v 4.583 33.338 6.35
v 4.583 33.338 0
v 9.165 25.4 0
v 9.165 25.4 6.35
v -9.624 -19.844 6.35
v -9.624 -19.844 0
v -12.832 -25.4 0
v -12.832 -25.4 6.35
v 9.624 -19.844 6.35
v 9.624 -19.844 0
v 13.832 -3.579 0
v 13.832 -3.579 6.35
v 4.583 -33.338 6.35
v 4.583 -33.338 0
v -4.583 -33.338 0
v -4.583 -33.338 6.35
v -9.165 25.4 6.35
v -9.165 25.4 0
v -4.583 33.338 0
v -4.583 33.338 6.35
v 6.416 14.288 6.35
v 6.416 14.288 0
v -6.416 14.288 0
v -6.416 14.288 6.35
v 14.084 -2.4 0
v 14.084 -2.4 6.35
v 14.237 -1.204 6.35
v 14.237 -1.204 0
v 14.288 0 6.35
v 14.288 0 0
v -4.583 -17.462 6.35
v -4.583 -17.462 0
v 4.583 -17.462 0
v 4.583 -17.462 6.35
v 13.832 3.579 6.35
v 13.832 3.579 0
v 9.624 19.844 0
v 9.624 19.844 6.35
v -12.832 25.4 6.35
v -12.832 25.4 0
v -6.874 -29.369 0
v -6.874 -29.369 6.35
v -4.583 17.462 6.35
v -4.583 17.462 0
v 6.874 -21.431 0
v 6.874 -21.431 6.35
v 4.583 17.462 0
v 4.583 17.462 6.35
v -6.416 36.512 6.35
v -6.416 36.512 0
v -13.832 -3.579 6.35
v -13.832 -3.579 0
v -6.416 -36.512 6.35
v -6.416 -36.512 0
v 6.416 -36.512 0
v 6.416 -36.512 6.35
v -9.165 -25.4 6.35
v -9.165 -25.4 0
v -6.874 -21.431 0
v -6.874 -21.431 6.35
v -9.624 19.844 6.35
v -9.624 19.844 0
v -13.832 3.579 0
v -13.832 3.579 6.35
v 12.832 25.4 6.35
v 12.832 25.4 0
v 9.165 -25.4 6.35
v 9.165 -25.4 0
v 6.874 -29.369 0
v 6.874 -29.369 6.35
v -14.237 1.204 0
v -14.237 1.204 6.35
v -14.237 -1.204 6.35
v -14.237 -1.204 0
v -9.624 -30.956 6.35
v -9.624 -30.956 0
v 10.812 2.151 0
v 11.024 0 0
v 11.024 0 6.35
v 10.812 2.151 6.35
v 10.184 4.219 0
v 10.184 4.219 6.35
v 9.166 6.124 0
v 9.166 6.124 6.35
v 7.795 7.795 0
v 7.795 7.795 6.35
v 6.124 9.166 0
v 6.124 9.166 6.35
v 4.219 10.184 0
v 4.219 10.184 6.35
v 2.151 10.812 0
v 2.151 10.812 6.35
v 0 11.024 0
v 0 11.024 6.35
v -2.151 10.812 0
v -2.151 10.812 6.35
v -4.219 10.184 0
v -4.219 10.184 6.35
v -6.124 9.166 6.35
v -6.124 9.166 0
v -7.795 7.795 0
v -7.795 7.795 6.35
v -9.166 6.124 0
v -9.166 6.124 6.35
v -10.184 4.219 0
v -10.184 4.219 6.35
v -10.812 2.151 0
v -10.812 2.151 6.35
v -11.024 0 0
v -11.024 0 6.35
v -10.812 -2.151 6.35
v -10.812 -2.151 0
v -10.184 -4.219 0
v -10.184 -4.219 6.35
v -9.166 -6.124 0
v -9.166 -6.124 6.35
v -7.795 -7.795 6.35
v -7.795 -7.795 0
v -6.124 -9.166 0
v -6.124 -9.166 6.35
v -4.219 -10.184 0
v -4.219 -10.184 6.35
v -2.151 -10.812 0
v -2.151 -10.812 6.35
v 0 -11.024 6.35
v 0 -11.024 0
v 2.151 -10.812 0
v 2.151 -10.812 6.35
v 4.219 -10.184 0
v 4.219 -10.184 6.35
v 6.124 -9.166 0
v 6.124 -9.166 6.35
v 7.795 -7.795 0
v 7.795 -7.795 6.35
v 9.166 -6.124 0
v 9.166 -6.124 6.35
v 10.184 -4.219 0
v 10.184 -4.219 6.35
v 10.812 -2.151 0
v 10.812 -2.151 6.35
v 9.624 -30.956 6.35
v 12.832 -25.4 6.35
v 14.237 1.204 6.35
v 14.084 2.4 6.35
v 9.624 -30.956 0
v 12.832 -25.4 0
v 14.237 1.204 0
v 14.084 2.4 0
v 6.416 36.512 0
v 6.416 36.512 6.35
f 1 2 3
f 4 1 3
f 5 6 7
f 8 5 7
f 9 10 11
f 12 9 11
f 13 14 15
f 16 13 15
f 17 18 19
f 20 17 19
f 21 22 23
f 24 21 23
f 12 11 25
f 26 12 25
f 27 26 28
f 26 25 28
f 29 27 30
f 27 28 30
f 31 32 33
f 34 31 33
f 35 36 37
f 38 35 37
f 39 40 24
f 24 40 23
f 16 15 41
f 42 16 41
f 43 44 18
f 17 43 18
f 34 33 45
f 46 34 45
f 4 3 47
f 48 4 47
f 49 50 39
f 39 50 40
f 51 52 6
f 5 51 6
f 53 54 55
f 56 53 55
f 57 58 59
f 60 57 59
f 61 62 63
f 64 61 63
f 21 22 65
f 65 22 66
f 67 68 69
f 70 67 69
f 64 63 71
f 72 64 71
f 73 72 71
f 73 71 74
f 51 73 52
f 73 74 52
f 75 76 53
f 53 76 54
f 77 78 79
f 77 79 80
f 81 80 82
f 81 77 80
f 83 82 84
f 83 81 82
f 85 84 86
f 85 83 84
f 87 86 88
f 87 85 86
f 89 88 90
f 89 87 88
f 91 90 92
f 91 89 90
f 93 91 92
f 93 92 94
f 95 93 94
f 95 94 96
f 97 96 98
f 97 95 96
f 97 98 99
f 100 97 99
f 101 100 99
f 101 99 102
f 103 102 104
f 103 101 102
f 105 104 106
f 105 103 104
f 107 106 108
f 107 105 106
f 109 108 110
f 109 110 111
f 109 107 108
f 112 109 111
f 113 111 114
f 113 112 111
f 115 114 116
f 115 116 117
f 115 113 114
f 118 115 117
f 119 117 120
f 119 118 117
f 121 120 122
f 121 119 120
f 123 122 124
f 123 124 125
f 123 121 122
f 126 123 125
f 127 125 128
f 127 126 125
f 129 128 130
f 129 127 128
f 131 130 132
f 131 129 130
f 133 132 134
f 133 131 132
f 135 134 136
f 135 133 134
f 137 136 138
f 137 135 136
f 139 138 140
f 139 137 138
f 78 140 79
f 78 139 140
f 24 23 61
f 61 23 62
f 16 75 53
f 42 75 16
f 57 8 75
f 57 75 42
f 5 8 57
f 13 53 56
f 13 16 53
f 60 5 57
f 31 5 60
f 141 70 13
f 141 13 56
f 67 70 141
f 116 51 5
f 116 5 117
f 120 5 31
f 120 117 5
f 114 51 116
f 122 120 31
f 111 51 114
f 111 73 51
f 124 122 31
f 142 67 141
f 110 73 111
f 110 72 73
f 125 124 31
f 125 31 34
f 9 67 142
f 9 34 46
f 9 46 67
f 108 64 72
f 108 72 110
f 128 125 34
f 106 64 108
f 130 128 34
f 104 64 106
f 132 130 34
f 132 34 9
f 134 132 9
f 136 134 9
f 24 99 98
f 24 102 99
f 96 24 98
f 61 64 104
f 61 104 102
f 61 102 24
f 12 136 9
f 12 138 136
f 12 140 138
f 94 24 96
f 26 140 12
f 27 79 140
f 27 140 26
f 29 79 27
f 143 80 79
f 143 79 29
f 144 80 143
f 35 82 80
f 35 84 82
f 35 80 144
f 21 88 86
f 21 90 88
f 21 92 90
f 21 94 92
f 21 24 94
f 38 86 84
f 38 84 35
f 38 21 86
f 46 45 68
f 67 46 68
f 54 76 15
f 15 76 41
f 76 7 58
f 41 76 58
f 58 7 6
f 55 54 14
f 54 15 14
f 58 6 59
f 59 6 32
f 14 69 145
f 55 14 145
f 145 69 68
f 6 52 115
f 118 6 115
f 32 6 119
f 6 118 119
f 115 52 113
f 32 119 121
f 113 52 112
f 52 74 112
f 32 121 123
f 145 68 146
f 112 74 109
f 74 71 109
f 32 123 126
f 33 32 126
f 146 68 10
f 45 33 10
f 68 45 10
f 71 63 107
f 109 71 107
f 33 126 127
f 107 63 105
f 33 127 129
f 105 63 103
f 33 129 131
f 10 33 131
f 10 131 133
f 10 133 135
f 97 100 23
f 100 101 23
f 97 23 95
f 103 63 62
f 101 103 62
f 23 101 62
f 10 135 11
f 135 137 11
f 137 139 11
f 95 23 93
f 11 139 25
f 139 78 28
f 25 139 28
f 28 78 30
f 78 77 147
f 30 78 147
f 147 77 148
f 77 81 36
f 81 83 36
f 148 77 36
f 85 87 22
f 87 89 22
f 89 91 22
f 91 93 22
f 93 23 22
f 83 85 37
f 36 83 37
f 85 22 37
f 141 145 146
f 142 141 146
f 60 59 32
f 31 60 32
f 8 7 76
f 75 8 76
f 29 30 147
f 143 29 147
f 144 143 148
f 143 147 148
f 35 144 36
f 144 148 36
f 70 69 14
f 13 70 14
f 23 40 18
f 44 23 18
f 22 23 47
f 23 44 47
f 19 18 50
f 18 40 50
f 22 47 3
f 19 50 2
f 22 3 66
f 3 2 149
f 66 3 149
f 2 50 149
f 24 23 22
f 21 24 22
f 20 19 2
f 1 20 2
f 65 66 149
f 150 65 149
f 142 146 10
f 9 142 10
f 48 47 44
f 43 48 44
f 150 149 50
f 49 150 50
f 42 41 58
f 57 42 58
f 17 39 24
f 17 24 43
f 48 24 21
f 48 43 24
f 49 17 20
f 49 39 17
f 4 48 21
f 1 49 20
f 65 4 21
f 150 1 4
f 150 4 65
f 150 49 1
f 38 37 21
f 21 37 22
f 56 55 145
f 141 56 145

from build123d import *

# Parameters (mm, degrees)
F2_DEPTH = 6.35
F1_R     = 11.0236


with BuildPart() as f2:
    # F0 (on Top) → F2 (new body)
    with BuildSketch(Plane.XY):
        Polygon((-6.4158048664, 14.2875), (0, 14.2875), (6.4158048664, 14.2875), (12.8316097327, 25.4), (6.4158048664, 36.5125), (-6.4158048664, 36.5125), (-12.8316097327, 25.4), align=None)
        Polygon((9.1654355234, 25.4), (4.5827177617, 17.4625), (-4.5827177617, 17.4625), (-9.1654355234, 25.4), (-4.5827177617, 33.3375), (4.5827177617, 33.3375), align=None, mode=Mode.SUBTRACT)
    extrude(amount=F2_DEPTH)


with BuildPart() as f2b:
    # F1 (on Top) → F2, piece 2 (new body)
    with BuildSketch(Plane.XY):
        with BuildLine():
            ThreePointArc((-13.8320149289, 3.5788293136), (-8.7464316332, 11.2974594461), (-1.41e-08, 14.2875))
            Line((-1.41e-08, 14.2875), (-6.4158048664, 14.2875))
            Line((-6.4158048664, 14.2875), (-9.6237072996, 19.84375))
            Line((-9.6237072996, 19.84375), (-13.8320149289, 3.5788293136))
        make_face()
        with BuildLine():
            Line((9.6237072996, 19.84375), (6.4158048664, 14.2875))
            Line((6.4158048664, 14.2875), (-1.41e-08, 14.2875))
            ThreePointArc((-1.41e-08, 14.2875), (8.7464317138, 11.2974593837), (13.8320149871, 3.5788290888))
            Line((13.8320149871, 3.5788290888), (9.6237072996, 19.84375))
        make_face()
        with BuildLine():
            ThreePointArc((13.8320149871, 3.5788290888), (8.7464317138, 11.2974593837), (-1.41e-08, 14.2875))
            ThreePointArc((-1.41e-08, 14.2875), (-8.7464316332, 11.2974594461), (-13.8320149289, 3.5788293136))
            ThreePointArc((-13.8320149289, 3.5788293136), (-14.2875, -8.4e-08), (-13.8320148869, -3.5788294762))
            ThreePointArc((-13.8320148869, -3.5788294762), (-8.7464315679, -11.2974594966), (-1.71e-08, -14.2875))
            ThreePointArc((-1.71e-08, -14.2875), (8.746431646, -11.2974594362), (13.8320149449, -3.578829252))
            ThreePointArc((13.8320149449, -3.578829252), (14.1731713066, -1.8038490409), (14.2875, 0))
            ThreePointArc((14.2875, 0), (14.1731713173, 1.8038489574), (13.8320149871, 3.5788290888))
        make_face()
        Circle(F1_R, mode=Mode.SUBTRACT)
        with BuildLine():
            Line((9.6237072996, -19.84375), (13.8320149449, -3.578829252))
            ThreePointArc((13.8320149449, -3.578829252), (8.746431646, -11.2974594362), (-1.71e-08, -14.2875))
            Line((-1.71e-08, -14.2875), (6.4158048664, -14.2875))
            Line((6.4158048664, -14.2875), (9.6237072996, -19.84375))
        make_face()
        with BuildLine():
            ThreePointArc((-1.71e-08, -14.2875), (-8.7464315679, -11.2974594966), (-13.8320148869, -3.5788294762))
            Line((-13.8320148869, -3.5788294762), (-9.6237072996, -19.84375))
            Line((-9.6237072996, -19.84375), (-6.4158048664, -14.2875))
            Line((-6.4158048664, -14.2875), (-1.71e-08, -14.2875))
        make_face()
        with BuildLine():
            ThreePointArc((9.6237072996, -19.84375), (5.5562499926, -15.7762926962), (-1.71e-08, -14.2875))
            ThreePointArc((-1.71e-08, -14.2875), (-5.5562500074, -15.7762927047), (-9.6237072996, -19.84375))
            ThreePointArc((-9.6237072996, -19.84375), (-11.1125, -25.4000000591), (-9.6237072405, -30.9562501024))
            ThreePointArc((-9.6237072405, -30.9562501024), (-5.5562499488, -35.0237073291), (0, -36.5125))
            ThreePointArc((0, -36.5125), (5.5562498804, -35.0237073686), (9.6237071615, -30.9562502392))
            ThreePointArc((9.6237071615, -30.9562502392), (10.7338507089, -28.2761267721), (11.1125, -25.4))
            ThreePointArc((11.1125, -25.4), (10.7338507446, -22.5238733613), (9.6237072996, -19.84375))
        make_face()
        Polygon((0, -17.4625), (4.5827177617, -17.4625), (6.8740766576, -21.4312500262), (9.1654355234, -25.4), (6.8740766192, -29.3687500405), (4.5827177617, -33.3375), (0, -33.3375), (-4.5827177617, -33.3375), (-6.8740766269, -29.368750027), (-9.1654355234, -25.4), (-6.8740765947, -21.4312499171), (-4.5827177617, -17.4625), align=None, mode=Mode.SUBTRACT)
        with BuildLine():
            ThreePointArc((-9.6237072405, -30.9562501024), (-11.1125, -25.4000000591), (-9.6237072996, -19.84375))
            Line((-9.6237072996, -19.84375), (-12.8316097327, -25.4))
            Line((-12.8316097327, -25.4), (-9.6237072405, -30.9562501024))
        make_face()
        with BuildLine():
            ThreePointArc((0, -36.5125), (-5.5562499488, -35.0237073291), (-9.6237072405, -30.9562501024))
            Line((-9.6237072405, -30.9562501024), (-6.4158048664, -36.5125))
            Line((-6.4158048664, -36.5125), (0, -36.5125))
        make_face()
        with BuildLine():
            ThreePointArc((9.6237071615, -30.9562502392), (5.5562498804, -35.0237073686), (0, -36.5125))
            Line((0, -36.5125), (6.4158048664, -36.5125))
            Line((6.4158048664, -36.5125), (9.6237071615, -30.9562502392))
        make_face()
        with BuildLine():
            Line((12.8316097327, -25.4), (9.6237072996, -19.84375))
            ThreePointArc((9.6237072996, -19.84375), (10.7338507446, -22.5238733613), (11.1125, -25.4))
            ThreePointArc((11.1125, -25.4), (10.7338507089, -28.2761267721), (9.6237071615, -30.9562502392))
            Line((9.6237071615, -30.9562502392), (12.8316097327, -25.4))
        make_face()
        with BuildLine():
            Line((6.4158048664, -14.2875), (-1.71e-08, -14.2875))
            ThreePointArc((-1.71e-08, -14.2875), (5.5562499926, -15.7762926962), (9.6237072996, -19.84375))
            Line((9.6237072996, -19.84375), (6.4158048664, -14.2875))
        make_face()
        with BuildLine():
            ThreePointArc((-9.6237072996, -19.84375), (-5.5562500074, -15.7762927047), (-1.71e-08, -14.2875))
            Line((-1.71e-08, -14.2875), (-6.4158048664, -14.2875))
            Line((-6.4158048664, -14.2875), (-9.6237072996, -19.84375))
        make_face()
    extrude(amount=F2_DEPTH)


solid = Compound([f2.part, f2b.part])
